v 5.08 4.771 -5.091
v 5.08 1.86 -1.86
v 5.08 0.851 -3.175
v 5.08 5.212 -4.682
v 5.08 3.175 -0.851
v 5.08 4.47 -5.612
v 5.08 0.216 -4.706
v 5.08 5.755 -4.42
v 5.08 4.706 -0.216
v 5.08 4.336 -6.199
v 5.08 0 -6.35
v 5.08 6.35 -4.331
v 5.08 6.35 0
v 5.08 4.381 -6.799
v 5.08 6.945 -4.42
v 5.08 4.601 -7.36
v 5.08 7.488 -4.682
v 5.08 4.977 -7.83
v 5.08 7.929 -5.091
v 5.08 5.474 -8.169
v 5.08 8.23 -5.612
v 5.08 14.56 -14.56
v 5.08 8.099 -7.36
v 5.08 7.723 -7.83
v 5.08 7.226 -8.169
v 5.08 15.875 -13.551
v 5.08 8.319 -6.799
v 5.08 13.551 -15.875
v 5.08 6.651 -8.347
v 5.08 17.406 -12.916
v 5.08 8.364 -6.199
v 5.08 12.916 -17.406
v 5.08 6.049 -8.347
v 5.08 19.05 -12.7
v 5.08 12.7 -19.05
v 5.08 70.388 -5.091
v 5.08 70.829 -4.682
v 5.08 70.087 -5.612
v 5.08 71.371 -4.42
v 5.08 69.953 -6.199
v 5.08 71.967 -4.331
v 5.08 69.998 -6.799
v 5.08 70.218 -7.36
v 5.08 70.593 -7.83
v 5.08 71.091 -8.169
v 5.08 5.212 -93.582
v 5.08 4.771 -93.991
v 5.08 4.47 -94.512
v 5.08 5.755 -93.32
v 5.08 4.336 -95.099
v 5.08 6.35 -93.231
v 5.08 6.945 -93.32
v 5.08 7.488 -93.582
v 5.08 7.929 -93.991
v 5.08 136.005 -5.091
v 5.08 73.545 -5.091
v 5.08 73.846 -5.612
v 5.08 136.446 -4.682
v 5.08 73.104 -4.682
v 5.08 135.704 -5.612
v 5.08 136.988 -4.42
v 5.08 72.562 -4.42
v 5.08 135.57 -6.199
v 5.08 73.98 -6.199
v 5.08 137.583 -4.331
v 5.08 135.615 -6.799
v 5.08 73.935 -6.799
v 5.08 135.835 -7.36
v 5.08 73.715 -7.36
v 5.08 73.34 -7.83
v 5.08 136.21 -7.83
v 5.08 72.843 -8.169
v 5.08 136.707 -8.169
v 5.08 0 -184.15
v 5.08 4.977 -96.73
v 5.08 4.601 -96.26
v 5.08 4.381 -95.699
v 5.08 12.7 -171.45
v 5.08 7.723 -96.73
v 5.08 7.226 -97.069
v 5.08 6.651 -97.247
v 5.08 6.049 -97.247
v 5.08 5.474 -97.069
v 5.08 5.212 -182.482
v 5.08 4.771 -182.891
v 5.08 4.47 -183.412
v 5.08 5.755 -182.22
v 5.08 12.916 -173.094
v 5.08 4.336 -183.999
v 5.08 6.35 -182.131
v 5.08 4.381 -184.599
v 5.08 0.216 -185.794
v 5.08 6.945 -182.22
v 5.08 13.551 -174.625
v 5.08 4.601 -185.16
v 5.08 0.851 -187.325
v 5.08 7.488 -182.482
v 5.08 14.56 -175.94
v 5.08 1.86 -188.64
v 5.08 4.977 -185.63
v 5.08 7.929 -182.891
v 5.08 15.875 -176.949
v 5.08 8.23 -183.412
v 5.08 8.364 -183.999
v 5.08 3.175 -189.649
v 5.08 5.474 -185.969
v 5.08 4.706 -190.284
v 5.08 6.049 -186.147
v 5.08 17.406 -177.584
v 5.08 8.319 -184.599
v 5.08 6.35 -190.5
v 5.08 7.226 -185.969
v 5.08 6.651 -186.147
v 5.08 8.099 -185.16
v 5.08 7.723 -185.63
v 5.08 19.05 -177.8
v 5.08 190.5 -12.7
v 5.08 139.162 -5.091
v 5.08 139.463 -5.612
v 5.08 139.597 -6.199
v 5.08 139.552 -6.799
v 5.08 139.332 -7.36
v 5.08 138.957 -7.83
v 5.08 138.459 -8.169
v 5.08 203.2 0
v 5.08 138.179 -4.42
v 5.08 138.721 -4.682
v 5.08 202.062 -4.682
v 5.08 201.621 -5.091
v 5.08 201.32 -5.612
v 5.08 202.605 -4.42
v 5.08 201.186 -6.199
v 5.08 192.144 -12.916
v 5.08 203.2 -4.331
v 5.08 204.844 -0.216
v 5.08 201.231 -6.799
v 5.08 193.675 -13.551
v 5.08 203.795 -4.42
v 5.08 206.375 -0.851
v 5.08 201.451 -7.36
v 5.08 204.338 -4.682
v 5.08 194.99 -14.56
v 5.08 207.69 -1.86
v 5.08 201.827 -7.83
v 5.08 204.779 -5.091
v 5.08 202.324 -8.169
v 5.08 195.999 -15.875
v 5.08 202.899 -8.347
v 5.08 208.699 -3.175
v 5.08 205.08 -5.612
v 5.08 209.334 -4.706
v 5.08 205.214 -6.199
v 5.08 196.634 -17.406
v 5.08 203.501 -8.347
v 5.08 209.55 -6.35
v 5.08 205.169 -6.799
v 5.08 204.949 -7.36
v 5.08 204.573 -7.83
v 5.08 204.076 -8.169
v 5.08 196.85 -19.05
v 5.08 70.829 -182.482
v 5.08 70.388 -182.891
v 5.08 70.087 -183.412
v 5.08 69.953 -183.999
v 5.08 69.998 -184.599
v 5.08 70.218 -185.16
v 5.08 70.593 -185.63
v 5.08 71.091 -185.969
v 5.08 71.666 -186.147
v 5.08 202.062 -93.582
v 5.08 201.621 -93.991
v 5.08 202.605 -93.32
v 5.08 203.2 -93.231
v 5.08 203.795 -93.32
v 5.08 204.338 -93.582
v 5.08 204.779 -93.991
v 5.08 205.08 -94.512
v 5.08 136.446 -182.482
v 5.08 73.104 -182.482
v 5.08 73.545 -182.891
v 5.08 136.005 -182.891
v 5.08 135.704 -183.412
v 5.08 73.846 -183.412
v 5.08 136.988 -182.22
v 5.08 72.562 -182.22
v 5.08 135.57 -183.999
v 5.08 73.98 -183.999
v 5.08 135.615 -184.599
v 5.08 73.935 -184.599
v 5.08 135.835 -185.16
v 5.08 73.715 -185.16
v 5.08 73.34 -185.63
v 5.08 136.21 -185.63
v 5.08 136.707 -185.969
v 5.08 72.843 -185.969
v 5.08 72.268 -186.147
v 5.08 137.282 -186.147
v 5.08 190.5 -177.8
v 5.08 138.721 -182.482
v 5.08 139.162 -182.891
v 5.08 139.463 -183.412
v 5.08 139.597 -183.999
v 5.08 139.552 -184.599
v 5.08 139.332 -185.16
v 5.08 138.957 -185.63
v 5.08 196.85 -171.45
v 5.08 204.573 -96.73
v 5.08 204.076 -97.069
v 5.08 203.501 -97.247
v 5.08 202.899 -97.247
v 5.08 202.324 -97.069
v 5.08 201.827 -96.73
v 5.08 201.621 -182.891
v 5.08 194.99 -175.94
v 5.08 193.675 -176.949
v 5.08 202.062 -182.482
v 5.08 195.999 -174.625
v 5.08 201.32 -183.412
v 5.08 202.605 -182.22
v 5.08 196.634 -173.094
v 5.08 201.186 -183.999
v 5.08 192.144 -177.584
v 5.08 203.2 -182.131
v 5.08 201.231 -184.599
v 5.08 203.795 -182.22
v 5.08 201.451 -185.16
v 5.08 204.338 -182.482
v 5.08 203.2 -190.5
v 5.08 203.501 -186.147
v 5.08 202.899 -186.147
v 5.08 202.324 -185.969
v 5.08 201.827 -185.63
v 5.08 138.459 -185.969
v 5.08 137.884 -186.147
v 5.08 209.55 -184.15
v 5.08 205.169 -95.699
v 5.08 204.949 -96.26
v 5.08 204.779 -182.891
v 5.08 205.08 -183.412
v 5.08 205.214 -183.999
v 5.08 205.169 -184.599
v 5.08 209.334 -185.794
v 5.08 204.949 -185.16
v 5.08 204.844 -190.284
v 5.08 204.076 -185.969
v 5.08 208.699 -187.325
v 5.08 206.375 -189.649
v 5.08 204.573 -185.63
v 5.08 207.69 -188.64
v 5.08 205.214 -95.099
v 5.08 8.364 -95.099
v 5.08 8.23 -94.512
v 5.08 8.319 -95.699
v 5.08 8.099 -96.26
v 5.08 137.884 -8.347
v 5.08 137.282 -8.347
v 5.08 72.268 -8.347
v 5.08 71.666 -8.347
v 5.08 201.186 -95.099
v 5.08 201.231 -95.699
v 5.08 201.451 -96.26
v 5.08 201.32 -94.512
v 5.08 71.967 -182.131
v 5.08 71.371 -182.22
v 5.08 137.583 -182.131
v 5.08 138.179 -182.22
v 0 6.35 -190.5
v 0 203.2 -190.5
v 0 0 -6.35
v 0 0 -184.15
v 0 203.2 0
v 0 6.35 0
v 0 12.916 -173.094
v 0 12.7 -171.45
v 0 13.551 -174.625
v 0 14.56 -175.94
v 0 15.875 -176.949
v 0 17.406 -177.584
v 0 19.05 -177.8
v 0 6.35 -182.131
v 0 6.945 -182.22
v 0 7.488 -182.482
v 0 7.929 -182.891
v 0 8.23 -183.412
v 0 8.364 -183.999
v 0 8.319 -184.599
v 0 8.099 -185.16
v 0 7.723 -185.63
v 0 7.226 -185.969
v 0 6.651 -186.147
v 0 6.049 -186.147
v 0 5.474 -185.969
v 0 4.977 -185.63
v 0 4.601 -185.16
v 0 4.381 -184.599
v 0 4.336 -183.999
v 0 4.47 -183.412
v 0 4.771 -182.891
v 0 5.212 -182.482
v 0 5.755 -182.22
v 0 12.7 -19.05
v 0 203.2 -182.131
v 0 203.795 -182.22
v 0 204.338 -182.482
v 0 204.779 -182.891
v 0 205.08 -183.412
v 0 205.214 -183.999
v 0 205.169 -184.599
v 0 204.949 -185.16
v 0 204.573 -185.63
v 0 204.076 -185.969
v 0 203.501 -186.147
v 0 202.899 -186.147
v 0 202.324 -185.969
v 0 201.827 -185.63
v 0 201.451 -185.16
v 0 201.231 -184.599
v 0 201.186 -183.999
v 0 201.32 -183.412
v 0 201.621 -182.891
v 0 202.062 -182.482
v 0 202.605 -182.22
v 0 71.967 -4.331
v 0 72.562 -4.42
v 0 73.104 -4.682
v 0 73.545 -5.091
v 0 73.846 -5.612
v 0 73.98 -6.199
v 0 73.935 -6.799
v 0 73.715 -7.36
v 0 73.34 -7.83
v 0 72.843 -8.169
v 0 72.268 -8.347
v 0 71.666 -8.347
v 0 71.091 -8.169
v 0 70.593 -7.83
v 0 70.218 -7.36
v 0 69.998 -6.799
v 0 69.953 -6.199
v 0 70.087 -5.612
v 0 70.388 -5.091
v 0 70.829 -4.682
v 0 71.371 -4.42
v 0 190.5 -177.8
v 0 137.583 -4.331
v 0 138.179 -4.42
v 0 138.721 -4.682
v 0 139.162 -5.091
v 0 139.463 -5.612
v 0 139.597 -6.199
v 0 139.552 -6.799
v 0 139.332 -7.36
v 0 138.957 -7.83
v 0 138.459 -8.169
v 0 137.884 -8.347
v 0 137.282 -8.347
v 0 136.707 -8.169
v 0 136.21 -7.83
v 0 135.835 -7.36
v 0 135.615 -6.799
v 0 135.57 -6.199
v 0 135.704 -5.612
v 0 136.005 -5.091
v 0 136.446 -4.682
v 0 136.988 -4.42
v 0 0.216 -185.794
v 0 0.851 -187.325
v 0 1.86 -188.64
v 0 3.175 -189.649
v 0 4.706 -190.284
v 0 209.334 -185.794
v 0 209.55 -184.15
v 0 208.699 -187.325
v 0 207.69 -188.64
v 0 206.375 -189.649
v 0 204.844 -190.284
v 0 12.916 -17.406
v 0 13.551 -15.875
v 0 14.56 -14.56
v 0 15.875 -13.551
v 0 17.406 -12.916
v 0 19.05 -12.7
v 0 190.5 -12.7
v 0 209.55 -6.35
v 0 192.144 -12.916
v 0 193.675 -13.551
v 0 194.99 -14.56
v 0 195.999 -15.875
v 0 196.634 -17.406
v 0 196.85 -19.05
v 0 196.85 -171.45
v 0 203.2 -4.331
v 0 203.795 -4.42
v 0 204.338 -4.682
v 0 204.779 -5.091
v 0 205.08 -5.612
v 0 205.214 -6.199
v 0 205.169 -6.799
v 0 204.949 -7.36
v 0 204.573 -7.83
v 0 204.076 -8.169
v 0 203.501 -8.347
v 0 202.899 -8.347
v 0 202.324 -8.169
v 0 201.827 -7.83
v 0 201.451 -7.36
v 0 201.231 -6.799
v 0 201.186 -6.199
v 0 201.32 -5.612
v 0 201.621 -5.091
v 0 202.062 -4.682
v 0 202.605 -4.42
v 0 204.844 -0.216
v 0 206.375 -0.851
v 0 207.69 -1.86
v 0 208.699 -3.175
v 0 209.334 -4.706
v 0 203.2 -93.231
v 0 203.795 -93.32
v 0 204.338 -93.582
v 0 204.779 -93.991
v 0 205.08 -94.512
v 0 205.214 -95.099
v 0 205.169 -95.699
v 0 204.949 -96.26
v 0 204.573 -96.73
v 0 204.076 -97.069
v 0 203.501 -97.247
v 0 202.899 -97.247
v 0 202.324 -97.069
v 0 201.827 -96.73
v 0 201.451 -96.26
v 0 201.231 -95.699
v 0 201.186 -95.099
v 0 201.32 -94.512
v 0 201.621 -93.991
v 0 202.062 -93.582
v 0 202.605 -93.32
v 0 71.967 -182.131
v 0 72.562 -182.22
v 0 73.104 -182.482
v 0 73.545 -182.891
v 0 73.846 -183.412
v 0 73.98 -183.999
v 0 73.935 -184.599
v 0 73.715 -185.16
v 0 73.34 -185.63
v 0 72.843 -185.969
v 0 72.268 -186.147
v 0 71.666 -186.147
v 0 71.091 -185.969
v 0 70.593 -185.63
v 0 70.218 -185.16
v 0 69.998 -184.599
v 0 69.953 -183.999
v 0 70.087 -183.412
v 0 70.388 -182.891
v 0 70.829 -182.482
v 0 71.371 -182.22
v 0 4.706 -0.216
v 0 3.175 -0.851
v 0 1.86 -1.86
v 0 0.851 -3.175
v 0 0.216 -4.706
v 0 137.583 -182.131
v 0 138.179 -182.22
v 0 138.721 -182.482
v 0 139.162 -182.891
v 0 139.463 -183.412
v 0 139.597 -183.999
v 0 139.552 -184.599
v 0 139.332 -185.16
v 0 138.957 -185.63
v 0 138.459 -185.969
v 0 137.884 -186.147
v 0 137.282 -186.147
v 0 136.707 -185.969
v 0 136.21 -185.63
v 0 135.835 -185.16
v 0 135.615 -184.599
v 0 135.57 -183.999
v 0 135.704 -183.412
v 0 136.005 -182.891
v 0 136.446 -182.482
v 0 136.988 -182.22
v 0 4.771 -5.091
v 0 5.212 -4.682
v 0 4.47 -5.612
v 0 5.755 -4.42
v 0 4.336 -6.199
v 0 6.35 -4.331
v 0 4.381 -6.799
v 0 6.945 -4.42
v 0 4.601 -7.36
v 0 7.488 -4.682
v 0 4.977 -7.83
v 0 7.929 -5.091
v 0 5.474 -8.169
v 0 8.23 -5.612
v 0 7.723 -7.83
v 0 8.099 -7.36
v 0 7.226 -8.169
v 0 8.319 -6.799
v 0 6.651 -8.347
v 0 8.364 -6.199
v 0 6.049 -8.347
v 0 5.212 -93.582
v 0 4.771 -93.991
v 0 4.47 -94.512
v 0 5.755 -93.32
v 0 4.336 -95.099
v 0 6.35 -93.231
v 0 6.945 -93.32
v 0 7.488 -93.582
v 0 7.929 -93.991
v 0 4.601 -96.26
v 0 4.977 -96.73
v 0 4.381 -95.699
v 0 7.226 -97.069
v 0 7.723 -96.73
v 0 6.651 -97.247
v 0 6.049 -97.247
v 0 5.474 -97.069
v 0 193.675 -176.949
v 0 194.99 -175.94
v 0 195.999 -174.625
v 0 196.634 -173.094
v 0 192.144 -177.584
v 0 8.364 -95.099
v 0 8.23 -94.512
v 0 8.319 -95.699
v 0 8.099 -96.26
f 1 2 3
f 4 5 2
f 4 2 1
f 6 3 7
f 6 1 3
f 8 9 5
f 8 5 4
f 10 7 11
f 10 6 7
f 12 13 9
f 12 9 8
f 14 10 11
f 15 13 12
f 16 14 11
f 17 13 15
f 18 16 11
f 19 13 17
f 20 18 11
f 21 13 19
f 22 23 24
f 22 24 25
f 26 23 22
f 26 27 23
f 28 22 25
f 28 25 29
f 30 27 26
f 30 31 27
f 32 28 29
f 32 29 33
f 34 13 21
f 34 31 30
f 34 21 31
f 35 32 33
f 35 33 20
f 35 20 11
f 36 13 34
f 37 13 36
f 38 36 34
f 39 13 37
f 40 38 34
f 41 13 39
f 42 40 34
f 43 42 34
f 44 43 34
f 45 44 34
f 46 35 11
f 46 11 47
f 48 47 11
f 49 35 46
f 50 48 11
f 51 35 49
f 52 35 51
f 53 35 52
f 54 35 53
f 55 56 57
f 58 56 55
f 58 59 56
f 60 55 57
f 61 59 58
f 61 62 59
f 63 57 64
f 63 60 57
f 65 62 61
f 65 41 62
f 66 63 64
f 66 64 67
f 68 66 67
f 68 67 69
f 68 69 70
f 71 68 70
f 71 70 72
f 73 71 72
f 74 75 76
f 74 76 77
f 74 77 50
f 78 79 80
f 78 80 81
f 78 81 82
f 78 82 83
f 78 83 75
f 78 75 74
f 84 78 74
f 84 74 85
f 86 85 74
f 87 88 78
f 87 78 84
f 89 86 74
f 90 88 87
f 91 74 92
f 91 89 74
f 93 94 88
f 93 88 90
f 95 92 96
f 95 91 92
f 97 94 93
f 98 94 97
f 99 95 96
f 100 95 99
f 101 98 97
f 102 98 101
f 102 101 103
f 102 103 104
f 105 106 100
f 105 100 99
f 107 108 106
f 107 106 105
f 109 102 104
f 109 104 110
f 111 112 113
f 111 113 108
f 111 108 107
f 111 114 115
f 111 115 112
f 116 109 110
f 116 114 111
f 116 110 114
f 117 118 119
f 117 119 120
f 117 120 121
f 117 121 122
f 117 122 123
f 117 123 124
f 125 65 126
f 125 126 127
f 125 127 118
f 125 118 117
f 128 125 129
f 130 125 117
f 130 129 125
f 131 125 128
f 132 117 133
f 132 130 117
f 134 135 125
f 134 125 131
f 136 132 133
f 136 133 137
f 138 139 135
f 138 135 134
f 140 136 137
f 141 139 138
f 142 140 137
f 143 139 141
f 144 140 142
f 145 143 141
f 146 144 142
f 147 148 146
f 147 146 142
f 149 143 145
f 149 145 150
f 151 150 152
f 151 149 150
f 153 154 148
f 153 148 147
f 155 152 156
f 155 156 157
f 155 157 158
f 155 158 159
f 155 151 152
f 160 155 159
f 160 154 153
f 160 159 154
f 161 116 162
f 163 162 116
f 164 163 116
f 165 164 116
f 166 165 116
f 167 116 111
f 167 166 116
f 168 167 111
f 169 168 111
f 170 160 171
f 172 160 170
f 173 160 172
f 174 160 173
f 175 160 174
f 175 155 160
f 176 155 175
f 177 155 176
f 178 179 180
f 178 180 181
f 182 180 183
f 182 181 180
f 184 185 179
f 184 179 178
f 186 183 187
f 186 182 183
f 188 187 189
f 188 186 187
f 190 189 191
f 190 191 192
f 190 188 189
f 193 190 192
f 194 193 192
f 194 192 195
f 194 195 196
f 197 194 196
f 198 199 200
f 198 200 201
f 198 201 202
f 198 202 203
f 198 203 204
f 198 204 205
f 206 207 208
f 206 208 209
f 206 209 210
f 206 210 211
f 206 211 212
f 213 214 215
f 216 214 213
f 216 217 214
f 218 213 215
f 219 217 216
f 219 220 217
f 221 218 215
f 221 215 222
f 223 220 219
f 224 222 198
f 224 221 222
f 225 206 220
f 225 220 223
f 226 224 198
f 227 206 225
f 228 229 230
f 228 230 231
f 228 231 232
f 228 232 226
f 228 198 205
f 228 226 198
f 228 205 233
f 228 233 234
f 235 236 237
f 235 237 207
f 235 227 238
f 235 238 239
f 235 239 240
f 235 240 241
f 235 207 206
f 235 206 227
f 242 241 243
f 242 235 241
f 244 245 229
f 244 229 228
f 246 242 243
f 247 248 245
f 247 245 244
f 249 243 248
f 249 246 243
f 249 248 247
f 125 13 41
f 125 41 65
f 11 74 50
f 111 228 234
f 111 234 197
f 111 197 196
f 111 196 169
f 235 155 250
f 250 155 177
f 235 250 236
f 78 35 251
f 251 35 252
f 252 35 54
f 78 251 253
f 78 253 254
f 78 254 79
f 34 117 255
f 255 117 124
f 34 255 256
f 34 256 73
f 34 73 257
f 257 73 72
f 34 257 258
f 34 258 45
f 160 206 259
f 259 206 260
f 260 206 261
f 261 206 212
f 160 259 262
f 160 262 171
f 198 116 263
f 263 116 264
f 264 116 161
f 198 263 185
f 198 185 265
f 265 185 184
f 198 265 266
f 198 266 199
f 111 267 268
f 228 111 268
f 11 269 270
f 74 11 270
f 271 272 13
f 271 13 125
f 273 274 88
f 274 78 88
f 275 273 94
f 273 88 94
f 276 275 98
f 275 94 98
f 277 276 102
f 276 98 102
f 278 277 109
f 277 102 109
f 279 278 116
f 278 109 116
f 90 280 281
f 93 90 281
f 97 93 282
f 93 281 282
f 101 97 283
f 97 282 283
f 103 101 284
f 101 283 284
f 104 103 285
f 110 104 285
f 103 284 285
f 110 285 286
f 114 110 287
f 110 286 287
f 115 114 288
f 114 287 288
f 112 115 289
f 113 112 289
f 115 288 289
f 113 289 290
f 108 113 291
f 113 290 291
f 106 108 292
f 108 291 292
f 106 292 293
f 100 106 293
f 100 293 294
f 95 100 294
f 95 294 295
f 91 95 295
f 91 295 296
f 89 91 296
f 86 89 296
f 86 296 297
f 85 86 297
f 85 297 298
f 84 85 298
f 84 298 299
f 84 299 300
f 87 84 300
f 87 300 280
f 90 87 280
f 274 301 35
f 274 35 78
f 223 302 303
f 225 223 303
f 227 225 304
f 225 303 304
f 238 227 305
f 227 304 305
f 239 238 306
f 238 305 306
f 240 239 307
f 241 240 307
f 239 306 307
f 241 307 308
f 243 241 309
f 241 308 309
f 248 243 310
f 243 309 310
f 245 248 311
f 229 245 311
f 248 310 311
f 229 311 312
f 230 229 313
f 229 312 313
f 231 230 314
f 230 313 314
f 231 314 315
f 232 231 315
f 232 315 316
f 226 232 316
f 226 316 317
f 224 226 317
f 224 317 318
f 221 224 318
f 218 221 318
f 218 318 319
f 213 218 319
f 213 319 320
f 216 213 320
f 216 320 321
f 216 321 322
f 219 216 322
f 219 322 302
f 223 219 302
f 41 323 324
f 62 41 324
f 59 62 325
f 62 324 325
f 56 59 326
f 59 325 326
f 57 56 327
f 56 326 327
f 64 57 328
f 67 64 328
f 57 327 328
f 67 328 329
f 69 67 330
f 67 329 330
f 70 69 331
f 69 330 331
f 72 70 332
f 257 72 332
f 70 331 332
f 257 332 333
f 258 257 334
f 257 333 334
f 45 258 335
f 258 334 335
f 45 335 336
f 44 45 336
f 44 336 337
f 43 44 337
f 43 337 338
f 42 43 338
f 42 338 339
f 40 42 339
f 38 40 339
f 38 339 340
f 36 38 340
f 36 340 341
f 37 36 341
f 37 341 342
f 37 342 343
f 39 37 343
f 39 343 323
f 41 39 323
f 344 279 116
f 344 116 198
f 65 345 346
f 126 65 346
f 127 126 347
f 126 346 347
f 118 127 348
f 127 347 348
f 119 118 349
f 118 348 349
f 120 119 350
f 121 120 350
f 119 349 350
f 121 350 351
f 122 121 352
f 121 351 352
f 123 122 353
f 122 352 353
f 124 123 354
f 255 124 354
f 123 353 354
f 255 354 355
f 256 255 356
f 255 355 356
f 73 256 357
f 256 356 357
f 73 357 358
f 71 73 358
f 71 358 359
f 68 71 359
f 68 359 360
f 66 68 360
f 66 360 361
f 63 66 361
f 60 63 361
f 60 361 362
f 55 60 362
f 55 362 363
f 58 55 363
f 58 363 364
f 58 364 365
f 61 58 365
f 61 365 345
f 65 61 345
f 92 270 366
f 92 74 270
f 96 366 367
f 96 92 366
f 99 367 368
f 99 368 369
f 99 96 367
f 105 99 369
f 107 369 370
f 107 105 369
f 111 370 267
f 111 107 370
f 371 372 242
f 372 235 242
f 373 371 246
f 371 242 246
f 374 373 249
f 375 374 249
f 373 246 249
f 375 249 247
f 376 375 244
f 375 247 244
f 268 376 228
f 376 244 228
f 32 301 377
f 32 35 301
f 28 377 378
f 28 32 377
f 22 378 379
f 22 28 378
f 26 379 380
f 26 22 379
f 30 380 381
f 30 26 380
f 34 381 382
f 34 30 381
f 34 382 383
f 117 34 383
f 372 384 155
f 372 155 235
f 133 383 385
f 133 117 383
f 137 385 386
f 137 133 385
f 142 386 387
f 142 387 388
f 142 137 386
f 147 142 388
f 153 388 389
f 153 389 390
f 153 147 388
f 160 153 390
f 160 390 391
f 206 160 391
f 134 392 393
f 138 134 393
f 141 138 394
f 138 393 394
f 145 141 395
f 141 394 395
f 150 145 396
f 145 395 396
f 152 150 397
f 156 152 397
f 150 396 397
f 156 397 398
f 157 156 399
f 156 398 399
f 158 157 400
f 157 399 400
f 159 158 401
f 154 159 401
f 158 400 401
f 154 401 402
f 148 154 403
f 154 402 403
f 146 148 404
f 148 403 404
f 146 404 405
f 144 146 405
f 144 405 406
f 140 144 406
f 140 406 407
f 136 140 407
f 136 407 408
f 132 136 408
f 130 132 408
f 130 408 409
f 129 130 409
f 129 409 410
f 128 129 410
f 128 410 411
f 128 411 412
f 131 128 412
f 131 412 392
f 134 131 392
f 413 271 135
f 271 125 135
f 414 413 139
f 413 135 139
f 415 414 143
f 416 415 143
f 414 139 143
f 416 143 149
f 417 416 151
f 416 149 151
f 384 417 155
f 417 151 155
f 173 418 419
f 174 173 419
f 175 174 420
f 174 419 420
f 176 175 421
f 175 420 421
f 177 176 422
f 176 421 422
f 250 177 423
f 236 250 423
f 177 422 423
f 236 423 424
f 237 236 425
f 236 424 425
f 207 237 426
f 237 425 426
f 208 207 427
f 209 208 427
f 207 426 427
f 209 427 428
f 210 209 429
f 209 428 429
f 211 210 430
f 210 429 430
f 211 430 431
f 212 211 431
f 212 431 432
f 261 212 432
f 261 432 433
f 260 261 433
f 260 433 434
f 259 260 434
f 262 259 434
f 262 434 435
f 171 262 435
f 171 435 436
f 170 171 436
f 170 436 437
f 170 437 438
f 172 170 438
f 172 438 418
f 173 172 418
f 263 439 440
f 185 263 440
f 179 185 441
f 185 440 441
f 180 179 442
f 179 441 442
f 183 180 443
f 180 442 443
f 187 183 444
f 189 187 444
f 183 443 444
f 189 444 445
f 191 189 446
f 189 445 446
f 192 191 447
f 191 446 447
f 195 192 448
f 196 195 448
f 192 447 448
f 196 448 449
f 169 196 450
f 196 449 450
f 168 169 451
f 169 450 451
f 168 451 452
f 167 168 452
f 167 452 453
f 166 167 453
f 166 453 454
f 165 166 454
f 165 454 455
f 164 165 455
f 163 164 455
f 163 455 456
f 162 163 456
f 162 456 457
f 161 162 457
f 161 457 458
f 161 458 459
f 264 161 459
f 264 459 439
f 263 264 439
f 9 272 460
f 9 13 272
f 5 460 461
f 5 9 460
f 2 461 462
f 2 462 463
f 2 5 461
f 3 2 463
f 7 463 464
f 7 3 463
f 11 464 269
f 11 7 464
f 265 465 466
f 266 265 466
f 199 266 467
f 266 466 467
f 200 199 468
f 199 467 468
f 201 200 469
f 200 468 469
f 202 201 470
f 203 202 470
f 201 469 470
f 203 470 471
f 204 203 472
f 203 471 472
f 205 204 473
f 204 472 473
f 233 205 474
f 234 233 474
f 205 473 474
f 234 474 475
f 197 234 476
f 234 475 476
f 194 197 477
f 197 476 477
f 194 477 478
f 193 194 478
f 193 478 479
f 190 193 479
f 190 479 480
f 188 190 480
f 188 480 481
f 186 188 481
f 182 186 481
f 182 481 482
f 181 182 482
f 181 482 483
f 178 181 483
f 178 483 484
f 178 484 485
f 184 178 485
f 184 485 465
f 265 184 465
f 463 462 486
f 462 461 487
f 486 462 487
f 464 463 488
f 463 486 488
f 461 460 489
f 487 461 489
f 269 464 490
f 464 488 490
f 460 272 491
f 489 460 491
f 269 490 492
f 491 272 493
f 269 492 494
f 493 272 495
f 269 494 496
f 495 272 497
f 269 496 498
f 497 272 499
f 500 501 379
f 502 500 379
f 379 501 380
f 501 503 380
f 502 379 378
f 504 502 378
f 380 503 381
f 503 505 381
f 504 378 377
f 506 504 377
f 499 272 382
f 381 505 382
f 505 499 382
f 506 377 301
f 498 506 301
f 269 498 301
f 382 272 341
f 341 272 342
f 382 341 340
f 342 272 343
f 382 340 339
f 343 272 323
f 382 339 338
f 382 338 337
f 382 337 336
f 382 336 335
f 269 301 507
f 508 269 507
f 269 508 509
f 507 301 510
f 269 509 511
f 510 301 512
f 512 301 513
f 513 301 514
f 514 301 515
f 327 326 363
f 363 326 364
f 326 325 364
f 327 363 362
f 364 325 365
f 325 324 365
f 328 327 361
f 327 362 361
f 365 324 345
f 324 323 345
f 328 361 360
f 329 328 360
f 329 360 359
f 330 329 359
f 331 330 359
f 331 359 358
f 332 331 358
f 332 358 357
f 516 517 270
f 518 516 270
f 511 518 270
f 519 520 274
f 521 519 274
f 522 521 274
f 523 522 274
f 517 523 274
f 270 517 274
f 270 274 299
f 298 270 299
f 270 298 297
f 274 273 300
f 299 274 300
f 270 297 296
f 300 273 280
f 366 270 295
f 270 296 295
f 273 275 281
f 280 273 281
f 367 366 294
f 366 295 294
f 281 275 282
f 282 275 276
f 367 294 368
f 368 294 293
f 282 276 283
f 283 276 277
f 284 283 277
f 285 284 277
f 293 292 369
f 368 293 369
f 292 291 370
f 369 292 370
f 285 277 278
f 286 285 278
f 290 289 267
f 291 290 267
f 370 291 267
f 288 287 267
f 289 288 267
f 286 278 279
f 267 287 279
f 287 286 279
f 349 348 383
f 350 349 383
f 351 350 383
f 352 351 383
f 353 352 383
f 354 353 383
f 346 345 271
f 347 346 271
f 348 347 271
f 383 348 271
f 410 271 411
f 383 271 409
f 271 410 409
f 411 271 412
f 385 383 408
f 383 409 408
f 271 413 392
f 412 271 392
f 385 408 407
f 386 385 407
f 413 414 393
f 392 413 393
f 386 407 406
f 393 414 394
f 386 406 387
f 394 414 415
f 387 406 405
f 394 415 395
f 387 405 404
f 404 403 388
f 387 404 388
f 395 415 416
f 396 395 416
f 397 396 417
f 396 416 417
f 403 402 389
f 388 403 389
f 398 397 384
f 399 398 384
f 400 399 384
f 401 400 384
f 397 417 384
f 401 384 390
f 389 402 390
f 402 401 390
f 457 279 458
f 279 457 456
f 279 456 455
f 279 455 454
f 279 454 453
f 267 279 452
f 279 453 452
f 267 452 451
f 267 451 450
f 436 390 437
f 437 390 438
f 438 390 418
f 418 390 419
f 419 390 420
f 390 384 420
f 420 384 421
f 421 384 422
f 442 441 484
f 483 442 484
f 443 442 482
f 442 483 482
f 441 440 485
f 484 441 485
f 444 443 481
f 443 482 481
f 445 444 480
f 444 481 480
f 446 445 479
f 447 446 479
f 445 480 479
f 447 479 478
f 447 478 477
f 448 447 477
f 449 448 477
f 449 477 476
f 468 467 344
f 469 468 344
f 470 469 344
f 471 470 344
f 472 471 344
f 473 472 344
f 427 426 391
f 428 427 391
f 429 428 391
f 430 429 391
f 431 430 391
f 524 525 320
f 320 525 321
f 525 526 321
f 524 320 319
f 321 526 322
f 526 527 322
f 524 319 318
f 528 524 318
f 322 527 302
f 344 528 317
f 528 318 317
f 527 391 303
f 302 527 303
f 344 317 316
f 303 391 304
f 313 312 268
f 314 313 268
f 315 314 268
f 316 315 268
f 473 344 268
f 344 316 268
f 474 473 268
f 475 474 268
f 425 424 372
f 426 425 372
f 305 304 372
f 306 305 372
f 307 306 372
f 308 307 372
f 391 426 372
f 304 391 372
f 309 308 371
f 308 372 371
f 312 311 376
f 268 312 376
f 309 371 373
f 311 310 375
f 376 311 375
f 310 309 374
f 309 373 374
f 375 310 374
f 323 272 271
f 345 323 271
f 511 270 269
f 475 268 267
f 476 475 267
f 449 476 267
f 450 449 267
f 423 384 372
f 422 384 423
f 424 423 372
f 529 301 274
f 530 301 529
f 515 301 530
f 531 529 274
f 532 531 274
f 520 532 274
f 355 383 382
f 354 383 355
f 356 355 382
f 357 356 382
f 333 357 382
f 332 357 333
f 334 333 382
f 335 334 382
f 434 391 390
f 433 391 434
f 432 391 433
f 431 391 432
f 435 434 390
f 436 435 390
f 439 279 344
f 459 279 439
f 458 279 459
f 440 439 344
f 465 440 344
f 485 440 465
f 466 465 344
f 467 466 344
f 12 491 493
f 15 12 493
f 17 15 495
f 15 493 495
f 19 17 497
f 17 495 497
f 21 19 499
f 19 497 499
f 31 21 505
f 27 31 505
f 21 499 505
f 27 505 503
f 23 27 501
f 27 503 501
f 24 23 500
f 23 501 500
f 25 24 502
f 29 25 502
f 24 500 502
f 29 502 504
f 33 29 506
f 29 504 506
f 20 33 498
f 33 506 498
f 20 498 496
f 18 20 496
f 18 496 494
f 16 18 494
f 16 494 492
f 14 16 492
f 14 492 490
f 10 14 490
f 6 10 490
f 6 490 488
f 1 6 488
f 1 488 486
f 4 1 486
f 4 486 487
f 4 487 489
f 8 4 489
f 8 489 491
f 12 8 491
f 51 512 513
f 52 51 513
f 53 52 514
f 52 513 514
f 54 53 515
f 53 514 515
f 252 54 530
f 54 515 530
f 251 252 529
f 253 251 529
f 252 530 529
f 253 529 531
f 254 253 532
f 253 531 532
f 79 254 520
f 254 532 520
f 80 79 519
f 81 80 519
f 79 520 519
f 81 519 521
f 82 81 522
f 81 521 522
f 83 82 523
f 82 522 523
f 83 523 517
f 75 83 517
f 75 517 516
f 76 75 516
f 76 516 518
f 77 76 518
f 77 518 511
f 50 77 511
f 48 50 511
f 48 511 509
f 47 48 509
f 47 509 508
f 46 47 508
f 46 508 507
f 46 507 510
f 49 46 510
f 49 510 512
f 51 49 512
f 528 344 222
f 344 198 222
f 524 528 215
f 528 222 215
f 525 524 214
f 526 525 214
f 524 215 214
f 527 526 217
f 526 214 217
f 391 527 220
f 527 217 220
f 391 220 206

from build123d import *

# Parameters (mm, degrees)
SKETCH1_W              = 190.5
SKETCH1_H              = 209.55
SKETCH1_W_2            = 165.1
SKETCH1_H_2            = 184.15
BOSS_EXTRUDE2_DEPTH    = 5.08
F_10_32_TAPPED_HOLE1_D = 4.0386
FILLET1_R              = 6.35


with BuildPart() as part:
    # Sketch1 → Boss-Extrude2 (new body)
    with BuildSketch(Plane(origin=(0, 0, 0), x_dir=(0, 0, -1), z_dir=(1, 0, 0))):
        with Locations((95.25, 104.775)):
            Rectangle(SKETCH1_W, SKETCH1_H)
        with Locations((95.25, 104.775)):
            Rectangle(SKETCH1_W_2, SKETCH1_H_2, mode=Mode.SUBTRACT)
    extrude(amount=BOSS_EXTRUDE2_DEPTH)

    # #10-32 Tapped Hole1 (through all)
    with Locations(Plane(origin=(5.08, 0, 0), x_dir=(0, 0, -1), z_dir=(1, 0, 0))):
        with Locations((6.35, 203.2), (184.15, 6.35), (6.35, 6.35), (184.15, 203.2), (95.25, 6.35), (95.25, 203.2), (6.35, 137.583333333), (6.35, 71.966666667), (184.15, 71.966666667), (184.15, 137.583333333)):
            Hole(F_10_32_TAPPED_HOLE1_D / 2)

    # Fillet1
    fillet1_edges = [part.edges().sort_by_distance(p)[0] for p in [
        (2.54, 196.85, -12.7),
        (2.54, 12.7, -12.7),
        (2.54, 12.7, -177.8),
        (2.54, 196.85, -177.8),
        (2.54, 209.55, 0),
        (2.54, 209.55, -190.5),
        (2.54, 0, -190.5),
        (2.54, 0, 0),
    ]]
    fillet(fillet1_edges, radius=FILLET1_R)


solid = part.part
